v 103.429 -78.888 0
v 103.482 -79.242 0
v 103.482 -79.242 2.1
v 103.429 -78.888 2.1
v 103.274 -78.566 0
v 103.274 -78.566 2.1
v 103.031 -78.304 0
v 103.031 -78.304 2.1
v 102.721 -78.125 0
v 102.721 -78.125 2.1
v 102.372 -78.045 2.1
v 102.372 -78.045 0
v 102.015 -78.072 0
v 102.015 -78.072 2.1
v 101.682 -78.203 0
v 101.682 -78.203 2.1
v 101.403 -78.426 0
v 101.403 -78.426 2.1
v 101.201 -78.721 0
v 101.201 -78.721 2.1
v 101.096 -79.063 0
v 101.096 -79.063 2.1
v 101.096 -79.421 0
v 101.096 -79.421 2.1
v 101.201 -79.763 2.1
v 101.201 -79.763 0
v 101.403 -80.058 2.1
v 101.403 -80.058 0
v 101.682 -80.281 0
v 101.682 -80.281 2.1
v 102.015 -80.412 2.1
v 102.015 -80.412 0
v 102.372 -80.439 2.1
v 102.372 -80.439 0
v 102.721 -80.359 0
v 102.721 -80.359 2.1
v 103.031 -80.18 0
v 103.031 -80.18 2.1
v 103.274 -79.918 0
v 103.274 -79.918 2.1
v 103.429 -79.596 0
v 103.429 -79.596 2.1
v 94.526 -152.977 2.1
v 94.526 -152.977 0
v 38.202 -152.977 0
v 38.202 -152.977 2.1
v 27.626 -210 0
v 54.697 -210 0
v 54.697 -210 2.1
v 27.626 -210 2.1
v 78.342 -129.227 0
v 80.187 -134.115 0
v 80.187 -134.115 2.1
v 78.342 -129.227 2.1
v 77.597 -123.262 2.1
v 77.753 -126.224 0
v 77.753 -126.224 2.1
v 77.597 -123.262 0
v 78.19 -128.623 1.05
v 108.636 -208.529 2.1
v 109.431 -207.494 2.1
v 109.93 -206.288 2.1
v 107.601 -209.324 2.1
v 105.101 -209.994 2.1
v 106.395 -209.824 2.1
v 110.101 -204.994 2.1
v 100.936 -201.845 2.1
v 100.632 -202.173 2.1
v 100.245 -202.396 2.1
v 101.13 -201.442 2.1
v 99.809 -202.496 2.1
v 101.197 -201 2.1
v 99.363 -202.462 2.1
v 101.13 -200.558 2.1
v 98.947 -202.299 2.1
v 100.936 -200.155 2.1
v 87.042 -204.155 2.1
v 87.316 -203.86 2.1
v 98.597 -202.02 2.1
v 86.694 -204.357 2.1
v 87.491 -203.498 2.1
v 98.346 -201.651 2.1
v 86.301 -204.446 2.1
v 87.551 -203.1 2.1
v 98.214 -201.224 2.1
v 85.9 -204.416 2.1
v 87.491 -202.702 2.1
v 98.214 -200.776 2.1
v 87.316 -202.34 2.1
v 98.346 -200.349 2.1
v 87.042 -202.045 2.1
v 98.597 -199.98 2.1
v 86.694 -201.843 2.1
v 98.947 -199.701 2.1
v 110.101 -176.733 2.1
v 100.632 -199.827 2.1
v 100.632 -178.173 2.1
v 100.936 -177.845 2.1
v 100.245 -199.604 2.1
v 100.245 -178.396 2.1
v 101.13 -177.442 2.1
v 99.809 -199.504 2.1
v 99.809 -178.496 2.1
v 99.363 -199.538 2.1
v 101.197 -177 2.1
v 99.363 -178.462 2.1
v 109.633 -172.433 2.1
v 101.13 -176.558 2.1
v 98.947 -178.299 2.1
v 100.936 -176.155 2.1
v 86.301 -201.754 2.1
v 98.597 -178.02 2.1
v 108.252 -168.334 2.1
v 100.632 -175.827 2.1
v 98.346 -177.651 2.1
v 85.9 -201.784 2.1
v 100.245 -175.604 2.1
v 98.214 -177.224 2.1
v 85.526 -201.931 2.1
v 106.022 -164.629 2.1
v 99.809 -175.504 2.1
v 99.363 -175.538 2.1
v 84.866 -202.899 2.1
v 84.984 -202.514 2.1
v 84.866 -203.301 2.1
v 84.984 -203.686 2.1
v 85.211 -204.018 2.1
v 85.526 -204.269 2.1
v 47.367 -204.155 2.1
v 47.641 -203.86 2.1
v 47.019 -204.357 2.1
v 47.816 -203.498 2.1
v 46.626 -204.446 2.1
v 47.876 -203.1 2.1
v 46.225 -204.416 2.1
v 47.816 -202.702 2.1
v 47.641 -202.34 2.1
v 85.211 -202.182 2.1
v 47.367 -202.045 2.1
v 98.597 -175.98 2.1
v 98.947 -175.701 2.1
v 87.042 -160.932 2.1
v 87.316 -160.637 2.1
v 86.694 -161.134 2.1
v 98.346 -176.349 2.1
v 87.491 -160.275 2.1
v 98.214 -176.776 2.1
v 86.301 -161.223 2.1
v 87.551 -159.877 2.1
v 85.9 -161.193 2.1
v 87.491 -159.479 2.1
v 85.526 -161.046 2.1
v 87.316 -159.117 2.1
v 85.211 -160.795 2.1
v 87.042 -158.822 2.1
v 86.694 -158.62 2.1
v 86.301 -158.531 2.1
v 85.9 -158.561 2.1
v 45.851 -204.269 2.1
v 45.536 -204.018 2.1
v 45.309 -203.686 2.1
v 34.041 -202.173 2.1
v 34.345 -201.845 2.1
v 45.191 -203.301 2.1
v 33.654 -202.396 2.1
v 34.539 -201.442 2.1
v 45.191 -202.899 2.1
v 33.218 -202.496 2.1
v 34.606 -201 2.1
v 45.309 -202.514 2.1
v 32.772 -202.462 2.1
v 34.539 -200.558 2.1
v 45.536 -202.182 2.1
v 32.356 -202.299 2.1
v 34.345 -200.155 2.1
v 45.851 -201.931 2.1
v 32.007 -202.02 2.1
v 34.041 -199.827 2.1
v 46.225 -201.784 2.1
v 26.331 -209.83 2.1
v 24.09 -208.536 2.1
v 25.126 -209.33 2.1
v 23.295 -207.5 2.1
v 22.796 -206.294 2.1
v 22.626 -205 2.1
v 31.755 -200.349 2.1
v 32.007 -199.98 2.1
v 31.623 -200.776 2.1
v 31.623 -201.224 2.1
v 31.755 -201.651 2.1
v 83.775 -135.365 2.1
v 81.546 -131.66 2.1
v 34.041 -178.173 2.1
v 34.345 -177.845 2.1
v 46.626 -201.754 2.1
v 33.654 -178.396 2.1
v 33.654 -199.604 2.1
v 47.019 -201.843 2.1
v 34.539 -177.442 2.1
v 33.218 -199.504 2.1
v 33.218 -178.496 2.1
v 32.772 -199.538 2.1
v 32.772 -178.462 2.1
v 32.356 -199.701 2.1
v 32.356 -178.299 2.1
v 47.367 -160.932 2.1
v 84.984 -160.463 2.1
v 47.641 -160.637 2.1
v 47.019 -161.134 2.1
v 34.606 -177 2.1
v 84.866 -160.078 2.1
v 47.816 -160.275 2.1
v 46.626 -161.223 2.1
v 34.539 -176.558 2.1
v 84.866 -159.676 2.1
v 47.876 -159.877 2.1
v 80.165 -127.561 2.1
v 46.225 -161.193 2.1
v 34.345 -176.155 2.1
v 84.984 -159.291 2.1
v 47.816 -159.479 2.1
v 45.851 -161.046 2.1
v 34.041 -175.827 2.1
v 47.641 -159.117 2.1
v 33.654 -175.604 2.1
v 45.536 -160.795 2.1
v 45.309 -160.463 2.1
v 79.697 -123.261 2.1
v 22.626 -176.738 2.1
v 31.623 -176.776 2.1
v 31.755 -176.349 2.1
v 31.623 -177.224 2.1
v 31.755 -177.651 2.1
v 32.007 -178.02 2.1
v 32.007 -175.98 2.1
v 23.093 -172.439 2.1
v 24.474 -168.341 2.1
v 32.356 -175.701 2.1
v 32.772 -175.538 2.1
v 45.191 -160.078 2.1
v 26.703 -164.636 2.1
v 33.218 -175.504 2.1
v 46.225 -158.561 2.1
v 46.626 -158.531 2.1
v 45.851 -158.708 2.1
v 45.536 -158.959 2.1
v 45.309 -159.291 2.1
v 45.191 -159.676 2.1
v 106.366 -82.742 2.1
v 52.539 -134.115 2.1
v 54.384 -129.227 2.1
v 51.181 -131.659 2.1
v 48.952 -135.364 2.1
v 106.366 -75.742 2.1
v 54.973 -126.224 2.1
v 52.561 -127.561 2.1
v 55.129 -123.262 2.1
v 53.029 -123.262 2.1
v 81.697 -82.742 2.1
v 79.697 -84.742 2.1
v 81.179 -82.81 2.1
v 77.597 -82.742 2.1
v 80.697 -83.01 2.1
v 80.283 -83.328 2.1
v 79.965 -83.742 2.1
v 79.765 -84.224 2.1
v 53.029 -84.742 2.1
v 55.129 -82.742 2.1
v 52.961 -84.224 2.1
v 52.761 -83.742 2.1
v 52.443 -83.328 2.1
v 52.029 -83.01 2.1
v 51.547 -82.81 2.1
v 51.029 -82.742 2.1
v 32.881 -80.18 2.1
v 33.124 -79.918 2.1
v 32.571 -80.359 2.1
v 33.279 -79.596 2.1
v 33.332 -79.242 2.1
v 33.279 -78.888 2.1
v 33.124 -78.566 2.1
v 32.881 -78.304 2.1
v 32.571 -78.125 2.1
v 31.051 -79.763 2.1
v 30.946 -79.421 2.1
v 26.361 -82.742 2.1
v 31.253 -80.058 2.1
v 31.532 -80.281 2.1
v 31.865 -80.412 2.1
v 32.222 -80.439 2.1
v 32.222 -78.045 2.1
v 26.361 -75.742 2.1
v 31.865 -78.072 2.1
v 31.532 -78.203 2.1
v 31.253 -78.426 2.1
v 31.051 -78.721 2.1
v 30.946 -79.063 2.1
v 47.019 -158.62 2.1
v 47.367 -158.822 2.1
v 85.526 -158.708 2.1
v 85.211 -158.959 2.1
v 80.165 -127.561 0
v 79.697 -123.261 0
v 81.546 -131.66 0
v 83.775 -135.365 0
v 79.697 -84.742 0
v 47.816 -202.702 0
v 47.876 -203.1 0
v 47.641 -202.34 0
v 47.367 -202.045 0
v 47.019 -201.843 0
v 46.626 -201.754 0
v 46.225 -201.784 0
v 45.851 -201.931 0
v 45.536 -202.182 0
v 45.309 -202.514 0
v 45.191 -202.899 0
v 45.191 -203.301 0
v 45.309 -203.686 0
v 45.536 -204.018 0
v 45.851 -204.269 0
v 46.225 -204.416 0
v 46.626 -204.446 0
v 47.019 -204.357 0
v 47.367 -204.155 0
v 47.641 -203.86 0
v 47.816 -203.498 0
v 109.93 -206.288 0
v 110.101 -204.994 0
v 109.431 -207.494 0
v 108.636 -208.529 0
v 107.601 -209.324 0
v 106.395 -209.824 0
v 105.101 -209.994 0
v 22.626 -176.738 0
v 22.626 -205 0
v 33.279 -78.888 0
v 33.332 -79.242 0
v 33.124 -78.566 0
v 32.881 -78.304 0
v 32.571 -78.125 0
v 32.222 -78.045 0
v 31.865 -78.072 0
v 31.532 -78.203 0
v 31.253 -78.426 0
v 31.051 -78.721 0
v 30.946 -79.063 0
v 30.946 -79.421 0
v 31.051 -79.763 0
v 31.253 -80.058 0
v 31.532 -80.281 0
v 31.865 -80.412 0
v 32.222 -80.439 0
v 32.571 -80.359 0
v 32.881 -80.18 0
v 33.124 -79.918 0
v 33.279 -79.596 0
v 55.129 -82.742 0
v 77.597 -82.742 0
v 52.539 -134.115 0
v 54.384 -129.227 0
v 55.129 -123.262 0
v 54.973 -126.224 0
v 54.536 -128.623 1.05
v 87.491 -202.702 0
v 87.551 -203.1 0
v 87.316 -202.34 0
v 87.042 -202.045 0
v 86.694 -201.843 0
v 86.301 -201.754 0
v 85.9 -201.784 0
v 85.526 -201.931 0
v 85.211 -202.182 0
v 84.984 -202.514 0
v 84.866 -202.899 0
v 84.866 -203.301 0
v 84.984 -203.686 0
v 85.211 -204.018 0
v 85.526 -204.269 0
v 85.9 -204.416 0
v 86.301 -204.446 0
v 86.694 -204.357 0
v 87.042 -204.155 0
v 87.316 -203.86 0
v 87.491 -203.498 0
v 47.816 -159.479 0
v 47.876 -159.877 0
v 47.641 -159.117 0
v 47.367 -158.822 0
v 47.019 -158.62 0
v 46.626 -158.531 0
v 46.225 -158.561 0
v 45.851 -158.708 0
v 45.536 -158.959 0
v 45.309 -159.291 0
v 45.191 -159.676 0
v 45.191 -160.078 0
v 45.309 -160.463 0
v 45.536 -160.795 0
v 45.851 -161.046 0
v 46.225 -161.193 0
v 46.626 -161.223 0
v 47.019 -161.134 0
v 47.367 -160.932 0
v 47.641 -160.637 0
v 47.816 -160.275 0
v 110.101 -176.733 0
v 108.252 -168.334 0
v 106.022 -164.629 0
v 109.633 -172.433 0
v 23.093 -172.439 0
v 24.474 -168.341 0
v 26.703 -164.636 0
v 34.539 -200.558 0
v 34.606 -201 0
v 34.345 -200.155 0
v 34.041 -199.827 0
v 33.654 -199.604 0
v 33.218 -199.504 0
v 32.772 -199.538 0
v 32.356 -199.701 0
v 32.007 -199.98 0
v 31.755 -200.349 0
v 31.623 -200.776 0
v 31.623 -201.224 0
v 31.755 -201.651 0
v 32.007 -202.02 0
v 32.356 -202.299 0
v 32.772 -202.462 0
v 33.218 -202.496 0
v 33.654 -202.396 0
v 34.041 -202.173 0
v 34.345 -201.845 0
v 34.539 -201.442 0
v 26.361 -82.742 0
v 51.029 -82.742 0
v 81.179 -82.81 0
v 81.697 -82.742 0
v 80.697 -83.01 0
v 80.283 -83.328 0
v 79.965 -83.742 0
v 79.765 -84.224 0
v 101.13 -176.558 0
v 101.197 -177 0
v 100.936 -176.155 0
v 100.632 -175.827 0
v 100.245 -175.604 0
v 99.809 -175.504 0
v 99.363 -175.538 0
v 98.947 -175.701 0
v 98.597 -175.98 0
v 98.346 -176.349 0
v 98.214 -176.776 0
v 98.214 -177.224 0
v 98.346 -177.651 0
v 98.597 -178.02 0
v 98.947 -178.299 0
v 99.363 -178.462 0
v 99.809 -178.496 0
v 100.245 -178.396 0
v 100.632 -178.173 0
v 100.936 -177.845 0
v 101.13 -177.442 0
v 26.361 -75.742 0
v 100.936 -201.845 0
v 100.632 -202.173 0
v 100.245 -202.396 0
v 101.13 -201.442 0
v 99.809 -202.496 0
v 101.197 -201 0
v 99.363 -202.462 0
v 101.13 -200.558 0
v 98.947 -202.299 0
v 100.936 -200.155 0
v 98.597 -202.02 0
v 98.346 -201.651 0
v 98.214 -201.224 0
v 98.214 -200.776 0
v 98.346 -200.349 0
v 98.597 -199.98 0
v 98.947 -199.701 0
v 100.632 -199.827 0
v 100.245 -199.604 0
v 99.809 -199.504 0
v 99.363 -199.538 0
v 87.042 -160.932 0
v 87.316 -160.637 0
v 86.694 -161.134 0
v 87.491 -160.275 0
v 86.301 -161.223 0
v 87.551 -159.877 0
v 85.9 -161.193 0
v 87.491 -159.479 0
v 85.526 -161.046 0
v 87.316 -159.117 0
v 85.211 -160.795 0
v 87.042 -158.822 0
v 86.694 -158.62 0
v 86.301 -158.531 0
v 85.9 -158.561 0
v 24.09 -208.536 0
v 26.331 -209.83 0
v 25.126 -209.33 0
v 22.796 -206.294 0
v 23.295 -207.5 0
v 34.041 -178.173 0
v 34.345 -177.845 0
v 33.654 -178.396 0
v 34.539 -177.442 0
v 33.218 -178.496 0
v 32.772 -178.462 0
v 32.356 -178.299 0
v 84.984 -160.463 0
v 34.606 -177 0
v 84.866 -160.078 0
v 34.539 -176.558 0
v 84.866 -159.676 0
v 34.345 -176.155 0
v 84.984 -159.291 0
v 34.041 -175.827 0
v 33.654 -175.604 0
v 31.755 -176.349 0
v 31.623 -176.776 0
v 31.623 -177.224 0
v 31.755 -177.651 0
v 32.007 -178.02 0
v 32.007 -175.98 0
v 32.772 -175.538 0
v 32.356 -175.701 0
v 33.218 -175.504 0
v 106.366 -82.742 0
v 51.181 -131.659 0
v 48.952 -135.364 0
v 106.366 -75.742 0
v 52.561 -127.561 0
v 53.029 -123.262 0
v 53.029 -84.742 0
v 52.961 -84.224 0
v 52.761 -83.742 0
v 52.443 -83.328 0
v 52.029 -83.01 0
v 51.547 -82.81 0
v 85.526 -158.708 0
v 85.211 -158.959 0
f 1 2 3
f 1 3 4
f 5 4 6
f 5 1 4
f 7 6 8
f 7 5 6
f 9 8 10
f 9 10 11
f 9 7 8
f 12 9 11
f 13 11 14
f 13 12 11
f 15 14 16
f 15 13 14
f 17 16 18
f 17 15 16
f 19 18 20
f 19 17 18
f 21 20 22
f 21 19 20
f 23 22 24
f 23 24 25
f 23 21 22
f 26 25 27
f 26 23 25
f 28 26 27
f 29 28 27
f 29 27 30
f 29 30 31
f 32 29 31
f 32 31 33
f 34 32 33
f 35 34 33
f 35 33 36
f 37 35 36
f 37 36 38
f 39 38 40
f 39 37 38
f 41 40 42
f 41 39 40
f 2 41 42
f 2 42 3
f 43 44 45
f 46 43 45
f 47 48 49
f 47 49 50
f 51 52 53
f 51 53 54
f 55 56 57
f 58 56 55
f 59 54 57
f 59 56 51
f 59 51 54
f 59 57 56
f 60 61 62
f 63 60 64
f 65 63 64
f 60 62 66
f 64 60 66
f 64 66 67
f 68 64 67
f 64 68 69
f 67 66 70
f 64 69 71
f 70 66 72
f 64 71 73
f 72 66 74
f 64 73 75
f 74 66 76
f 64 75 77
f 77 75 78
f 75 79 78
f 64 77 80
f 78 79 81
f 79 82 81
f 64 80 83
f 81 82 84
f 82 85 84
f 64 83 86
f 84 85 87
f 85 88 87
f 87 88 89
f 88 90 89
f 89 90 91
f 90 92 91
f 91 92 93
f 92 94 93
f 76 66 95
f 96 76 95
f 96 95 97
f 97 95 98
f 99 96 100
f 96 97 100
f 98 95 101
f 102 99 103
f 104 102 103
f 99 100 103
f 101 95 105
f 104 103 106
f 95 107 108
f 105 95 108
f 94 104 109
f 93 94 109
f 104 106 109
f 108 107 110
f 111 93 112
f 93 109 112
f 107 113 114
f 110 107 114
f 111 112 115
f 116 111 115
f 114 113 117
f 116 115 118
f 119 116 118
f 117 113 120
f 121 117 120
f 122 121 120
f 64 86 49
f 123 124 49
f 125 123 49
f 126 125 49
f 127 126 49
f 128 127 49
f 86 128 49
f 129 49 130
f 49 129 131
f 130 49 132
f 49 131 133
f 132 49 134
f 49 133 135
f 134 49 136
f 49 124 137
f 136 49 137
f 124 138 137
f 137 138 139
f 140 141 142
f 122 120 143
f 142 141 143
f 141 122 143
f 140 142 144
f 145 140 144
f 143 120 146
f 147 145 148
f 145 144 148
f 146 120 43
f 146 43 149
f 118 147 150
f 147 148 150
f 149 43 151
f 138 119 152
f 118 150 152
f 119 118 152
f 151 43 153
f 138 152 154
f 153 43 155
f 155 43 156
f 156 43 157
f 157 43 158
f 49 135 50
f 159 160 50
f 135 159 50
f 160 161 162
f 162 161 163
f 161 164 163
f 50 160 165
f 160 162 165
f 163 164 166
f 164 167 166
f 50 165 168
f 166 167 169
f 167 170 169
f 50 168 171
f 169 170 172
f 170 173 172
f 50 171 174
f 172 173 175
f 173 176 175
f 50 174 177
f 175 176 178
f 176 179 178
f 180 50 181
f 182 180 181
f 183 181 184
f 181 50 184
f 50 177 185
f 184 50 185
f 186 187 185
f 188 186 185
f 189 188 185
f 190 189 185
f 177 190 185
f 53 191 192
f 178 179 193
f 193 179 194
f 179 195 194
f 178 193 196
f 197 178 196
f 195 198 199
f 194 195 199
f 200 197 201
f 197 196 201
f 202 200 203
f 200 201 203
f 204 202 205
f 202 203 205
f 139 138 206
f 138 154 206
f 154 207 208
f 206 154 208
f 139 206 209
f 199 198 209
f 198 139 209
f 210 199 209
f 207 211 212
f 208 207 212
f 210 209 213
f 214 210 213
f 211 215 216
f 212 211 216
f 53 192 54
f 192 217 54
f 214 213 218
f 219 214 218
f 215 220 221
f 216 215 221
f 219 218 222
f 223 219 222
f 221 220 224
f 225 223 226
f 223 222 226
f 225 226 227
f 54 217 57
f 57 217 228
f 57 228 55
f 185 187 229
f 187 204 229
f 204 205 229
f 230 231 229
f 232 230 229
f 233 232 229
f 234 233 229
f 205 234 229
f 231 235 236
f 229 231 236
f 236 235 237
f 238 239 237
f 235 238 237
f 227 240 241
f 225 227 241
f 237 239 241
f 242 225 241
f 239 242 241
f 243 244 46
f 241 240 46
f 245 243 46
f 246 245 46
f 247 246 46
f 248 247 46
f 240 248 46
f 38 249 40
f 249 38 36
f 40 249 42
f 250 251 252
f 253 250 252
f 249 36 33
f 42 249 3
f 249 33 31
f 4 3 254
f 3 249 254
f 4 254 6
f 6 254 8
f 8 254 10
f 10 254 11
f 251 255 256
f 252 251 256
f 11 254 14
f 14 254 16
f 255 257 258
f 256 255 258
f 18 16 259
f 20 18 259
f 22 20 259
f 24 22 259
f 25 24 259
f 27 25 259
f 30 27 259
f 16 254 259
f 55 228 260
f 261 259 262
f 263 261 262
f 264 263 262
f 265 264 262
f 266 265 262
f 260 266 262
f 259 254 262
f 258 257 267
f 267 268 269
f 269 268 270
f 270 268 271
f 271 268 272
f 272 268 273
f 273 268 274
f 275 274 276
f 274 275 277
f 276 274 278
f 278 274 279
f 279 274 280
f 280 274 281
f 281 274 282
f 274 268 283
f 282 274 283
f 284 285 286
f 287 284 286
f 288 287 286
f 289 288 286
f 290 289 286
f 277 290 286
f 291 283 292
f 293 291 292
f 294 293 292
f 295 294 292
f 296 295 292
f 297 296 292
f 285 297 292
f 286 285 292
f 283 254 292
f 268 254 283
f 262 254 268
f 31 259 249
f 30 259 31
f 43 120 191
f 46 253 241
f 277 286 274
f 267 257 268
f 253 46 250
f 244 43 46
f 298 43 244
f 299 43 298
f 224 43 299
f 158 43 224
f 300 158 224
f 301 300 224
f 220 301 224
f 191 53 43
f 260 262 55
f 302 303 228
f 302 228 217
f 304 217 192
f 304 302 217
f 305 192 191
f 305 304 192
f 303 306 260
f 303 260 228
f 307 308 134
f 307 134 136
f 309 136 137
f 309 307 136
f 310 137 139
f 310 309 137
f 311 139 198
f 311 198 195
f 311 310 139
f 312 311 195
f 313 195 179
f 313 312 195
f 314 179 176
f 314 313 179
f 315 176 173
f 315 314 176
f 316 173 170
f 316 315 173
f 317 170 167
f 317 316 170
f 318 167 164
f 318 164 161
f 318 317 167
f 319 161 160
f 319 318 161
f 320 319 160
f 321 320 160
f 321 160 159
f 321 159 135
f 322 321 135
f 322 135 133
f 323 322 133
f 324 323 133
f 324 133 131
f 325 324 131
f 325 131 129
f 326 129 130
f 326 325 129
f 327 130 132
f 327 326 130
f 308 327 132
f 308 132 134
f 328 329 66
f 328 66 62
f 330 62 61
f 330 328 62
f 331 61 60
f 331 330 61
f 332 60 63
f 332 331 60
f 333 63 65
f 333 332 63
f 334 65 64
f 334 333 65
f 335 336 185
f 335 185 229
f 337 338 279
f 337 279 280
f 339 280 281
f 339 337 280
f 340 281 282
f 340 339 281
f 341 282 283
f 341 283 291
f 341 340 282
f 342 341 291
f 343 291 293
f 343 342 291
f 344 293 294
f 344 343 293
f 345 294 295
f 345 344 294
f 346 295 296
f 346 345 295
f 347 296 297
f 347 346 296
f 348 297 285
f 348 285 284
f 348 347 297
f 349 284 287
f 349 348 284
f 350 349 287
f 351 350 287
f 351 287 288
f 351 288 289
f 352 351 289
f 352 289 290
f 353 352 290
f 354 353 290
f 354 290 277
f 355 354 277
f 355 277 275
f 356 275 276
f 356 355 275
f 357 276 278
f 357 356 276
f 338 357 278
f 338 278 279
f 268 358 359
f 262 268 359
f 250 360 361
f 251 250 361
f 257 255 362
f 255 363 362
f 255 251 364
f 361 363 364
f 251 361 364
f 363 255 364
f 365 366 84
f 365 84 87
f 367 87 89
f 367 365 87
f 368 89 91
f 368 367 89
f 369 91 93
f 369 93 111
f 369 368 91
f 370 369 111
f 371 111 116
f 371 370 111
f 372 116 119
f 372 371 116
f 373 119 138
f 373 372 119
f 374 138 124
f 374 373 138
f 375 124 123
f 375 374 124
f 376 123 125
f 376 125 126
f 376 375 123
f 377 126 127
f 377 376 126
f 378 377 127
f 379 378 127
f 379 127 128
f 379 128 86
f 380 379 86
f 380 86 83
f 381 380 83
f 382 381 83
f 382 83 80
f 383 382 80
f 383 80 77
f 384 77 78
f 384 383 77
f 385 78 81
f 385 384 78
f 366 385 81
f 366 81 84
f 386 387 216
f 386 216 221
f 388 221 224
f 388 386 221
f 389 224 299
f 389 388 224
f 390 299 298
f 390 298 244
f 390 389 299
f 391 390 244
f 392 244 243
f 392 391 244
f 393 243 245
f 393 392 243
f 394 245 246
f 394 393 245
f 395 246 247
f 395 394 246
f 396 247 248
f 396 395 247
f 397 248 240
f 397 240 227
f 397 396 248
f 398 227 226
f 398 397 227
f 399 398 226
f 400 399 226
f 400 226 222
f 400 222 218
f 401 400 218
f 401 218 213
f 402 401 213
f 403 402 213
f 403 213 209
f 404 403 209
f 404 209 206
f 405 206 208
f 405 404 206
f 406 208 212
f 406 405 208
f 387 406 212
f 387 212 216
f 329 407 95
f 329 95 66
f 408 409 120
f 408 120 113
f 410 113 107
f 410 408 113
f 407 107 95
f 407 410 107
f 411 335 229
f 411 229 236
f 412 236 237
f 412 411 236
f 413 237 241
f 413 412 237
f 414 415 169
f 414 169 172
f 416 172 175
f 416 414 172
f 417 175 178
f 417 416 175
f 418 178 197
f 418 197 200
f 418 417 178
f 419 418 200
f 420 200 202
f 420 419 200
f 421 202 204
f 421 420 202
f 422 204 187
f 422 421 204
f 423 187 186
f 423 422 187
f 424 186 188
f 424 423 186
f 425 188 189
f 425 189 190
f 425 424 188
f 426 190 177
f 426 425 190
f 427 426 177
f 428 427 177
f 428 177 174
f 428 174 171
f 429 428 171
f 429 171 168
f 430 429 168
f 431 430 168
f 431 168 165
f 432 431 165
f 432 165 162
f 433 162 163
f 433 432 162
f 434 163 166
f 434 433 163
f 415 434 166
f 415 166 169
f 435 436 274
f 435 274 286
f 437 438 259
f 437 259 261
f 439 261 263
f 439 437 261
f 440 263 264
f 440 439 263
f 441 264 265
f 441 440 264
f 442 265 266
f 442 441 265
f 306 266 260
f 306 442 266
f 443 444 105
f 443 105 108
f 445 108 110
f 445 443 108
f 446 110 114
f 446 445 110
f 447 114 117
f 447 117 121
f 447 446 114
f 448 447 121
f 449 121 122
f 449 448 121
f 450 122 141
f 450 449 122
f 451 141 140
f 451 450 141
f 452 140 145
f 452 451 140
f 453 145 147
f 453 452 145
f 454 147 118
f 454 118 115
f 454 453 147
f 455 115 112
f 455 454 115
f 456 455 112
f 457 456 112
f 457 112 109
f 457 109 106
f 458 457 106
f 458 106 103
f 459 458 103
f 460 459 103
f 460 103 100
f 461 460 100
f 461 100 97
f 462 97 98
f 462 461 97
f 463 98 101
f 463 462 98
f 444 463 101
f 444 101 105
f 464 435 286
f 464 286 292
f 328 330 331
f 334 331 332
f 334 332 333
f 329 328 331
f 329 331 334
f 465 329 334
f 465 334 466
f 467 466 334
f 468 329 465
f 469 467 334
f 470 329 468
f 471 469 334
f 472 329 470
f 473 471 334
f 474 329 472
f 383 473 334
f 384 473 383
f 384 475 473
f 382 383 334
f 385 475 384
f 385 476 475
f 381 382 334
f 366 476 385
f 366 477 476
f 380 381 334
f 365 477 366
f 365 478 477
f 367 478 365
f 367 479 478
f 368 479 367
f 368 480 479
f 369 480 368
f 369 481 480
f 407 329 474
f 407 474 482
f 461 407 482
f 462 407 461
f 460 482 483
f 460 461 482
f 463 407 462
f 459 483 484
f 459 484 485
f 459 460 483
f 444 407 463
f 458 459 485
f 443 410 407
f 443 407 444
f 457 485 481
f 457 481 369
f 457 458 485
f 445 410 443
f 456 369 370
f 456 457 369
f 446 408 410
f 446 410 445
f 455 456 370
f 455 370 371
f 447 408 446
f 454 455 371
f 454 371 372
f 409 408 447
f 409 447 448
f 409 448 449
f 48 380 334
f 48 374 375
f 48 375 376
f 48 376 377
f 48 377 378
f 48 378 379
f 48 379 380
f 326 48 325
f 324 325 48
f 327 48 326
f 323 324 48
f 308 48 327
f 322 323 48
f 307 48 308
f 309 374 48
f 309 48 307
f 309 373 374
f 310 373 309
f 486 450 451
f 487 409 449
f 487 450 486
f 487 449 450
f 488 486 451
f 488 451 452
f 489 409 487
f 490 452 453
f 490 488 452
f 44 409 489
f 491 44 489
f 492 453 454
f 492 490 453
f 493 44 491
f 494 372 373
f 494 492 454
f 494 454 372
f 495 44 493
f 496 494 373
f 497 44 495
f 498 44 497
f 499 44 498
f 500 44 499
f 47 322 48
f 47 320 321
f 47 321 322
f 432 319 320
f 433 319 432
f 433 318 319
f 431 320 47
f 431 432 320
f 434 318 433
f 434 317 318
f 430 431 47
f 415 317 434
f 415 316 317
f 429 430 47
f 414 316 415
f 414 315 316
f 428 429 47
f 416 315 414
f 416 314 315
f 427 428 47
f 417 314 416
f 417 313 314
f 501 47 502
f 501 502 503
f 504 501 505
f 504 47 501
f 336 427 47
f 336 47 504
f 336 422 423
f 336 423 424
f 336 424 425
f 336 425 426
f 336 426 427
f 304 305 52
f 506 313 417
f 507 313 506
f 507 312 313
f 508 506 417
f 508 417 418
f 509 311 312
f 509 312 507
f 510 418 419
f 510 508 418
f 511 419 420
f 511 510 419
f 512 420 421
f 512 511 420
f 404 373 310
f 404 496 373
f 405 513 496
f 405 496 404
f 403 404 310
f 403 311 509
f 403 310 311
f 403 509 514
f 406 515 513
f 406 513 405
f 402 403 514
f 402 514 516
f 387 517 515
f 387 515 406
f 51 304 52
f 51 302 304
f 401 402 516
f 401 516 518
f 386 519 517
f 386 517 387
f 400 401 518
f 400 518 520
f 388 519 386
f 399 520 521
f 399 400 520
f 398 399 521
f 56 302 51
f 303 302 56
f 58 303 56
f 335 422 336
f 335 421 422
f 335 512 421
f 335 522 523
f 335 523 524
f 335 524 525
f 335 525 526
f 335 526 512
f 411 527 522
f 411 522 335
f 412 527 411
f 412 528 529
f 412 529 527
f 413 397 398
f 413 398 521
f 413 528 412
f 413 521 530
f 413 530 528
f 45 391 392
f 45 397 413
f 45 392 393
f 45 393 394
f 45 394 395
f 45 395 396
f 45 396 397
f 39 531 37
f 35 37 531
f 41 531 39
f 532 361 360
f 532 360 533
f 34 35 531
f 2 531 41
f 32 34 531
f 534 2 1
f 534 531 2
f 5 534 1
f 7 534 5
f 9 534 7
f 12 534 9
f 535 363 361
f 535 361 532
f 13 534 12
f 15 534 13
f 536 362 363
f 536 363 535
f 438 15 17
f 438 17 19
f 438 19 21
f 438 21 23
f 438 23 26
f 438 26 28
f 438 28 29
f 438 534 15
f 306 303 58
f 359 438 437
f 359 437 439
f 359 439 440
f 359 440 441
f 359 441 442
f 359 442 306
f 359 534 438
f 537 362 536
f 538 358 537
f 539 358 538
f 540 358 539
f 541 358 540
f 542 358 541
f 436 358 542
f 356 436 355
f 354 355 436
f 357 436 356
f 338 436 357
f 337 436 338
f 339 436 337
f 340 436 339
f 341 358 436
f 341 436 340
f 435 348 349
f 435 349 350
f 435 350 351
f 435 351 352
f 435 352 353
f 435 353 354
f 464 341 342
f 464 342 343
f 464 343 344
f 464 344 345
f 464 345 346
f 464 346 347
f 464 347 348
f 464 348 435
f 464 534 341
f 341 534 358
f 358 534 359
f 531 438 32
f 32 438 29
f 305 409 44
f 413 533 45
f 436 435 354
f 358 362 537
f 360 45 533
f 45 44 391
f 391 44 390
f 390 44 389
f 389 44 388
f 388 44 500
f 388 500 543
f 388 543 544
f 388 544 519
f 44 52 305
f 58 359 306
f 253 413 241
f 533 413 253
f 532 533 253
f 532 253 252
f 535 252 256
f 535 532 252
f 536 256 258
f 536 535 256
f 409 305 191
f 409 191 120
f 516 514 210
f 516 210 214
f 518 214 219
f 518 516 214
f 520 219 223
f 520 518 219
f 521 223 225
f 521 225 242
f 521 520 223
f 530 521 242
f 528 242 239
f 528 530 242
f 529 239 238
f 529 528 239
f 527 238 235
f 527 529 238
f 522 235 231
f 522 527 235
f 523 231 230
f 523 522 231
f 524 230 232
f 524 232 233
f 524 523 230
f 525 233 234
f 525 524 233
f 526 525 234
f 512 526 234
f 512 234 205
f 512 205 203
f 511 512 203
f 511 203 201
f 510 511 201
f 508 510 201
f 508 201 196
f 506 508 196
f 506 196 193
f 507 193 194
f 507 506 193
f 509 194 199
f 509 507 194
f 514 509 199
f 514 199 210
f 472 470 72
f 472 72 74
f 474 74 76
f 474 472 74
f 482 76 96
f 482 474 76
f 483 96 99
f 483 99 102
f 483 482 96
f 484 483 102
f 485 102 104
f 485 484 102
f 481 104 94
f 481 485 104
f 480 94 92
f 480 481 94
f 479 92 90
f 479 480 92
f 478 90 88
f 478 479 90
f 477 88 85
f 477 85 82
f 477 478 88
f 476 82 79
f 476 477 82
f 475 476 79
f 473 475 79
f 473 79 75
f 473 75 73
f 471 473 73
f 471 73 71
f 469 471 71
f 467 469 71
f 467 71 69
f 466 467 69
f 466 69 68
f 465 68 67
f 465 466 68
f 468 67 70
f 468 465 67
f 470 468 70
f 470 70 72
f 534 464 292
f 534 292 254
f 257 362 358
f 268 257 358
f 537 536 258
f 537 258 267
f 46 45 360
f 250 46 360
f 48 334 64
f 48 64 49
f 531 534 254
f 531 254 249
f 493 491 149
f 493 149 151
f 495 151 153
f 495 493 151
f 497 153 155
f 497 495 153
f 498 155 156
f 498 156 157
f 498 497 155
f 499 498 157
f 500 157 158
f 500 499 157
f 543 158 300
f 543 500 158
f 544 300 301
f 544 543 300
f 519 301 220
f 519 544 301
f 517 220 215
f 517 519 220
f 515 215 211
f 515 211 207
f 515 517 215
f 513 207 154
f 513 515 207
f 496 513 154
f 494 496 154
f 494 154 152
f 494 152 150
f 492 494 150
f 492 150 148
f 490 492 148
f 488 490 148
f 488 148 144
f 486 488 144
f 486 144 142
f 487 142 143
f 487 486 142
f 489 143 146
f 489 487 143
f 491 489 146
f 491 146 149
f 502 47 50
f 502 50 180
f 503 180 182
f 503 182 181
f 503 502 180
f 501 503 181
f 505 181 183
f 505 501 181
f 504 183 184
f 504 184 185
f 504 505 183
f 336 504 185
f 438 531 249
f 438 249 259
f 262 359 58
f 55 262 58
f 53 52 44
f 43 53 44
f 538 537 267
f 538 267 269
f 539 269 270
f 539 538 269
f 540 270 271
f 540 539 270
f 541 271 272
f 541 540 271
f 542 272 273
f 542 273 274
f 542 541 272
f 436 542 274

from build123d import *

# Parameters (mm, degrees)
SKETCH2_R           = 1.35
SKETCH2_R_2         = 1.5
SKETCH2_R_3         = 1.2
BOSS_EXTRUDE1_DEPTH = 2.1


with BuildPart() as part:
    # Sketch2 → Boss-Extrude1 (new body)
    with BuildSketch(Plane.XY):
        with BuildLine():
            Line((26.360509399, -75.742028439), (106.365509399, -75.742028439))
            Line((106.365509399, -75.742028439), (106.365509399, -82.742028439))
            Line((106.365509399, -82.742028439), (96.904474191, -82.742028439))
            Line((96.904474191, -82.742028439), (81.697018799, -82.742028439))
            ThreePointArc((81.697018799, -82.742028439), (80.282805236, -83.327814877), (79.697018799, -84.742028439))
            Line((79.697018799, -84.742028439), (79.697018799, -123.261425865))
            ThreePointArc((79.697018799, -123.261425865), (80.744039239, -129.647705362), (83.77547538, -135.365328342))
            Line((83.77547538, -135.365328342), (106.022052818, -164.628605146))
            ThreePointArc((106.022052818, -164.628605146), (109.053488959, -170.346228126), (110.100509399, -176.732507623))
            Line((110.100509399, -176.732507623), (110.100509399, -204.994023391))
            ThreePointArc((110.100509399, -204.994023391), (108.636252911, -208.529347679), (105.101102272, -209.994023356))
            Line((105.101102272, -209.994023356), (54.697018799, -210))
            Line((54.697018799, -210), (25.307981201, -210))
            Line((25.307981201, -210), (27.625509399, -210))
            ThreePointArc((27.625509399, -210), (24.089975493, -208.535533906), (22.625509399, -205))
            Line((22.625509399, -205), (22.625509399, -176.738128469))
            ThreePointArc((22.625509399, -176.738128469), (23.672257836, -170.352656272), (26.702934917, -164.635582379))
            Line((26.702934917, -164.635582379), (48.951574482, -135.364417621))
            ThreePointArc((48.951574482, -135.364417621), (51.982251563, -129.647343728), (53.029, -123.261871531))
            Line((53.029, -123.261871531), (53.029, -84.742028439))
            ThreePointArc((53.029, -84.742028439), (52.443213562, -83.327814877), (51.029, -82.742028439))
            Line((51.029, -82.742028439), (37.207455392, -82.742028439))
            Line((37.207455392, -82.742028439), (26.360509399, -82.742028439))
            Line((26.360509399, -82.742028439), (26.360509399, -75.742028439))
        make_face()
        with Locations((46.525509399, -159.877)):
            Circle(SKETCH2_R, mode=Mode.SUBTRACT)
        with Locations((46.525509399, -203.1)):
            Circle(SKETCH2_R, mode=Mode.SUBTRACT)
        with Locations((86.200509399, -203.1)):
            Circle(SKETCH2_R, mode=Mode.SUBTRACT)
        with Locations((86.200509399, -159.877)):
            Circle(SKETCH2_R, mode=Mode.SUBTRACT)
        with Locations((33.106129256, -201)):
            Circle(SKETCH2_R_2, mode=Mode.SUBTRACT)
        with Locations((33.106129256, -177)):
            Circle(SKETCH2_R_2, mode=Mode.SUBTRACT)
        with Locations((99.697018799, -177)):
            Circle(SKETCH2_R_2, mode=Mode.SUBTRACT)
        with Locations((99.697018799, -201)):
            Circle(SKETCH2_R_2, mode=Mode.SUBTRACT)
        with Locations((32.132455392, -79.242028439)):
            Circle(SKETCH2_R_3, mode=Mode.SUBTRACT)
        with Locations((102.282455392, -79.242028439)):
            Circle(SKETCH2_R_3, mode=Mode.SUBTRACT)
        with BuildLine():
            Line((55.129, -82.742028439), (77.597018799, -82.742028439))
            Line((77.597018799, -82.742028439), (77.597018799, -123.261871531))
            add(Edge.make_bspline(
                [(80.187269615, -134.115336952), (77.487014109, -128.558048488), (77.597018799, -123.261871531)],
                knots=[0, 0, 0, 0.393827238, 0.393827238, 0.393827238], degree=2))
            Line((80.187269615, -134.115336952), (94.526314775, -152.977))
            Line((94.526314775, -152.977), (38.202239304, -152.977))
            Line((38.202239304, -152.977), (52.538749184, -134.115336952))
            add(Edge.make_bspline(
                [(52.538749184, -134.115336952), (55.239004689, -128.558048488), (55.129, -123.261871531)],
                knots=[0, 0, 0, 0.393827238, 0.393827238, 0.393827238], degree=2))
            Line((55.129, -123.261871531), (55.129, -82.742028439))
        make_face(mode=Mode.SUBTRACT)
    extrude(amount=BOSS_EXTRUDE1_DEPTH)


solid = part.part
